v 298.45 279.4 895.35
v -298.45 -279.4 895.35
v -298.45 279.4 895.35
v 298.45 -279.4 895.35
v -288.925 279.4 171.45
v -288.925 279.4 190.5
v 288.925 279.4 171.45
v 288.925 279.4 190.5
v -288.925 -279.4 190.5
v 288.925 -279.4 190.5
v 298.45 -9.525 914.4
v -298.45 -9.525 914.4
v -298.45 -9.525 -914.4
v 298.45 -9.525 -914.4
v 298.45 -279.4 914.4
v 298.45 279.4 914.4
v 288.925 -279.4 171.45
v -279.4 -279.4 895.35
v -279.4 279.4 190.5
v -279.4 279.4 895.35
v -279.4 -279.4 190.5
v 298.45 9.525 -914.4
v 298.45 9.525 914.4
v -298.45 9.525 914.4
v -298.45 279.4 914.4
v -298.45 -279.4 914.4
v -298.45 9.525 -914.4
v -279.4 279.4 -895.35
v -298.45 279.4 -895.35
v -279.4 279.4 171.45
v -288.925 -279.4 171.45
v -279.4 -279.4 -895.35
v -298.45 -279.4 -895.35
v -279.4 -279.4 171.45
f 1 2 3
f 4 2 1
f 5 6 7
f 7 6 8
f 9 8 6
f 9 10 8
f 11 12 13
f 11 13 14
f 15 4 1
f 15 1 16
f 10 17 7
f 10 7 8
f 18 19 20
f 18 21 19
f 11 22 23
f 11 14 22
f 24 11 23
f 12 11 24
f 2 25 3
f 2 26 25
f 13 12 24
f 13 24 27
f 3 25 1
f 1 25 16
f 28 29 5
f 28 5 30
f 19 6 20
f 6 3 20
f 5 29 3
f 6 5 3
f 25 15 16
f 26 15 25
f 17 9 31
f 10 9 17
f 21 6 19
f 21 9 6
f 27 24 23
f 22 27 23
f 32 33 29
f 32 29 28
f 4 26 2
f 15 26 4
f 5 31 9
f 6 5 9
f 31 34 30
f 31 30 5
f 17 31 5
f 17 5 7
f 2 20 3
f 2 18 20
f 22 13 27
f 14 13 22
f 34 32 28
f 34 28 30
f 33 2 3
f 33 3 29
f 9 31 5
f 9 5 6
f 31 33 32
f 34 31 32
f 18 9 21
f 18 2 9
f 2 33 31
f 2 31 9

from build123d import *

# Parameters (mm, degrees)
F2_DEPTH      = 279.4
F3_DEPTH      = 279.4
F3_DEPTH_BACK = 279.4
F1_W          = 558.8
F1_H          = 19.05
F1_W_2        = 9.525
F4_DEPTH      = 279.4
F4_DEPTH_BACK = 279.4
F1_H_2        = 1066.8
F1_H_3        = 704.85
F5_DEPTH      = 9.525


with BuildPart() as f2:
    # F1 (on Front) → F2 (new body, symmetric)
    with BuildSketch(Plane.XZ):
        Polygon((-279.4, 895.35), (-298.45, 895.35), (-298.45, -895.35), (-279.4, -895.35), (-279.4, 171.45), (-288.925, 171.45), (-288.925, 190.5), (-279.4, 190.5), align=None)
    extrude(amount=F2_DEPTH, both=True)


with BuildPart() as f3:
    # F1 (on Front) → F3 (new body, two sides)
    with BuildSketch(Plane.XZ) as f3_sk:
        Polygon((-298.45, 914.4), (-298.45, 895.35), (-279.4, 895.35), (279.4, 895.35), (298.45, 895.35), (298.45, 914.4), align=None)
    extrude(amount=F3_DEPTH)
    extrude(f3_sk.sketch, amount=-F3_DEPTH_BACK)


with BuildPart() as f4:
    # F1 (on Front) → F4 (new body, two sides)
    with BuildSketch(Plane.XZ) as f4_sk:
        with Locations((0, 180.975)):
            Rectangle(F1_W, F1_H)
        with Locations((-284.1625, 180.975)):
            Rectangle(F1_W_2, F1_H)
        with Locations((284.1625, 180.975)):
            Rectangle(F1_W_2, F1_H)
    extrude(amount=F4_DEPTH)
    extrude(f4_sk.sketch, amount=-F4_DEPTH_BACK)


with BuildPart() as f5:
    # F1 (on Front) → F5 (new body, symmetric)
    with BuildSketch(Plane.XZ):
        with Locations((284.1625, 180.975)):
            Rectangle(F1_W_2, F1_H)
        with Locations((0, 180.975)):
            Rectangle(F1_W, F1_H)
        with Locations((-284.1625, 180.975)):
            Rectangle(F1_W_2, F1_H)
        Polygon((-279.4, -895.35), (-298.45, -895.35), (-298.45, -914.4), (298.45, -914.4), (298.45, -895.35), (279.4, -895.35), align=None)
        Polygon((-298.45, 914.4), (-298.45, 895.35), (-279.4, 895.35), (279.4, 895.35), (298.45, 895.35), (298.45, 914.4), align=None)
        Polygon((-279.4, 895.35), (-298.45, 895.35), (-298.45, -895.35), (-279.4, -895.35), (-279.4, 171.45), (-288.925, 171.45), (-288.925, 190.5), (-279.4, 190.5), align=None)
        Polygon((298.45, 895.35), (279.4, 895.35), (279.4, 190.5), (288.925, 190.5), (288.925, 171.45), (279.4, 171.45), (279.4, -895.35), (298.45, -895.35), align=None)
        with Locations((0, -361.95)):
            Rectangle(F1_W, F1_H_2)
        with Locations((0, 542.925)):
            Rectangle(F1_W, F1_H_3)
    extrude(amount=F5_DEPTH, both=True)


solid = Compound([f2.part, f3.part, f4.part, f5.part])
